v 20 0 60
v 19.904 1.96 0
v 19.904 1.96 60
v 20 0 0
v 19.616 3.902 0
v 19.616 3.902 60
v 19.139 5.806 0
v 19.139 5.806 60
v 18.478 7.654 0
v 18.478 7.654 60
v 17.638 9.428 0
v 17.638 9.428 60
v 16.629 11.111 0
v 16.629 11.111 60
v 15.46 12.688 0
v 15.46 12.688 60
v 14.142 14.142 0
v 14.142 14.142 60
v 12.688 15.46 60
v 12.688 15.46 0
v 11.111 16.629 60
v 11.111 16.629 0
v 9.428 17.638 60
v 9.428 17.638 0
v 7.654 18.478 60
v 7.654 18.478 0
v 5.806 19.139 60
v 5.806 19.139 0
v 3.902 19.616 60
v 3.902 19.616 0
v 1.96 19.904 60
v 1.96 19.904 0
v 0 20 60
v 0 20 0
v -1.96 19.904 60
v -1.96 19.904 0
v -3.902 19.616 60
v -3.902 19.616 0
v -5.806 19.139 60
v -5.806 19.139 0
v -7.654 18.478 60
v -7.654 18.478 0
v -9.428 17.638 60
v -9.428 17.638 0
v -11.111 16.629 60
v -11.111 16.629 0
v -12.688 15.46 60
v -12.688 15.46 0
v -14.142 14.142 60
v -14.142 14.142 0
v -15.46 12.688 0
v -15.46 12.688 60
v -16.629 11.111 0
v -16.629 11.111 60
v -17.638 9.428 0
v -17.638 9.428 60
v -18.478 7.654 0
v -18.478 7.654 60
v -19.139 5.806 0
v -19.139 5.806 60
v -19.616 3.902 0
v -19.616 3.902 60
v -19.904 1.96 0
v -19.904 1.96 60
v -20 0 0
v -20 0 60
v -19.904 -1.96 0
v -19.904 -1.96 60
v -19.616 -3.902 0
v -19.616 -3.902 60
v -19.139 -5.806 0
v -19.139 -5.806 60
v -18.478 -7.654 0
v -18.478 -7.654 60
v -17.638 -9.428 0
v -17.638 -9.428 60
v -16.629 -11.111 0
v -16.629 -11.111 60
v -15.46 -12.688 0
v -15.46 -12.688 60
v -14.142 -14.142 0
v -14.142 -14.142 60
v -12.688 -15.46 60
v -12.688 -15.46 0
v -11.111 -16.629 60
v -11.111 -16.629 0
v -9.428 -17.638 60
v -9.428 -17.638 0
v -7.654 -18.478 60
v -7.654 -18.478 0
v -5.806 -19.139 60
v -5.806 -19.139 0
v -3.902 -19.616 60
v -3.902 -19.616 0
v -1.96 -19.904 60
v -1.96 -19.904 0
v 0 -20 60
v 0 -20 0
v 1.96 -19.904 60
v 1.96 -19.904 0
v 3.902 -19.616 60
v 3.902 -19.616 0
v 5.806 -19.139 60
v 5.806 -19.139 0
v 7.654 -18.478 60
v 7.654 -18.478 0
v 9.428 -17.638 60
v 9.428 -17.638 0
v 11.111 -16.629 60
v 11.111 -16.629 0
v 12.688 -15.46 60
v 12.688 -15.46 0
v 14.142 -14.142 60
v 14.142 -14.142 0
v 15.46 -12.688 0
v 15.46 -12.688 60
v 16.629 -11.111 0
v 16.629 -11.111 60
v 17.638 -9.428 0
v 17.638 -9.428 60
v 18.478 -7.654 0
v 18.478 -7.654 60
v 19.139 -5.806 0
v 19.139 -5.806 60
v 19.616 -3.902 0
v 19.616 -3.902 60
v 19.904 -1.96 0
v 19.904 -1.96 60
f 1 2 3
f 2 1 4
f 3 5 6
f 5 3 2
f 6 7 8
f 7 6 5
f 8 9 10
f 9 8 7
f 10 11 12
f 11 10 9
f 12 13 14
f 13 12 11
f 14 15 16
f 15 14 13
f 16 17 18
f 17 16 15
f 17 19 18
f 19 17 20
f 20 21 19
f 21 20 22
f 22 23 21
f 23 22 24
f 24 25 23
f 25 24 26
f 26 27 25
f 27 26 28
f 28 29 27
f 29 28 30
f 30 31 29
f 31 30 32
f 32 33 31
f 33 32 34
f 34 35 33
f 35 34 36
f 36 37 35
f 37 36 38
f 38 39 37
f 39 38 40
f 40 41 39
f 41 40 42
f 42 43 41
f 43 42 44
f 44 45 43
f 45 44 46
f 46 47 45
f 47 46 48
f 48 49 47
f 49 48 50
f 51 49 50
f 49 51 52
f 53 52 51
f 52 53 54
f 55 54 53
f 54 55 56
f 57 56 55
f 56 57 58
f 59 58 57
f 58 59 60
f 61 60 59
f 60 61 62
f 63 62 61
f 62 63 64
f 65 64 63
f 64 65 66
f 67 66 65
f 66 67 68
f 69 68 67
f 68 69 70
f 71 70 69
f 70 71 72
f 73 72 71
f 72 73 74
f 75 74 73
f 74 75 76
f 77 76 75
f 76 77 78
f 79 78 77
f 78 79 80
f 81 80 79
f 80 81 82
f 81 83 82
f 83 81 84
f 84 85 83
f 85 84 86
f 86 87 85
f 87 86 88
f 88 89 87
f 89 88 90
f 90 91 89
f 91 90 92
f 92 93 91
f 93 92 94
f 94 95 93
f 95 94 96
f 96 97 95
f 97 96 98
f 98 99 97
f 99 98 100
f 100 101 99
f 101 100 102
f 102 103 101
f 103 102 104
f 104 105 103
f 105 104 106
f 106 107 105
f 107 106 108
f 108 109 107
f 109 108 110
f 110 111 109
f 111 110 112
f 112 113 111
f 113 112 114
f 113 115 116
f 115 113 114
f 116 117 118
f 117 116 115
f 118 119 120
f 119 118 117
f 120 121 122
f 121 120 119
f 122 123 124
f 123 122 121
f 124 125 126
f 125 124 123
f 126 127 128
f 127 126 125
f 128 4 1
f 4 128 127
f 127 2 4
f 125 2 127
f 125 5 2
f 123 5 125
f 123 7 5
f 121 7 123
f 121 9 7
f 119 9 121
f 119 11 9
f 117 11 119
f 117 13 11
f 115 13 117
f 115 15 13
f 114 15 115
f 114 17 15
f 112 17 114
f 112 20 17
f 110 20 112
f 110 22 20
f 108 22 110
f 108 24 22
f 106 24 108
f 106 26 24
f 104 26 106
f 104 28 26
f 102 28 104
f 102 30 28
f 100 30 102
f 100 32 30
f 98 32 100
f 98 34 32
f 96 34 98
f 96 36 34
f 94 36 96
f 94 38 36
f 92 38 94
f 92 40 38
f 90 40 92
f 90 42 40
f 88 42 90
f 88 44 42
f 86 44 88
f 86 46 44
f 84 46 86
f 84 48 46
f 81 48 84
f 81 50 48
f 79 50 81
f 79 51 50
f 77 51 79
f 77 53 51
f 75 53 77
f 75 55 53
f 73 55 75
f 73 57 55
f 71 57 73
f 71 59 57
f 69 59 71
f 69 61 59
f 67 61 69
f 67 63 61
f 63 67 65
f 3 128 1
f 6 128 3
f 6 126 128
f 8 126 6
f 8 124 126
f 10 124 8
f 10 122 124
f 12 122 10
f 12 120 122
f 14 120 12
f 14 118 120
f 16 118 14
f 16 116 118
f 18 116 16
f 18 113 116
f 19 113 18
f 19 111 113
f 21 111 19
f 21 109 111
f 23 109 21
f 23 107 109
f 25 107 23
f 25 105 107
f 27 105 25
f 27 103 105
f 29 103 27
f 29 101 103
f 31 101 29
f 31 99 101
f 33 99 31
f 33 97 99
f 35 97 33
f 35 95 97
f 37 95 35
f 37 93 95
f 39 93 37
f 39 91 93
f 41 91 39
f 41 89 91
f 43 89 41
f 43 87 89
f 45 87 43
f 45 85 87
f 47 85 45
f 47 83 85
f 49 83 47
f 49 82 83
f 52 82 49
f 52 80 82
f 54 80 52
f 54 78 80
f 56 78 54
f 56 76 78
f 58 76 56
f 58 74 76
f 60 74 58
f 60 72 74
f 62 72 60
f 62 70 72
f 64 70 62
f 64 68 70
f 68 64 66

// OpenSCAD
// Cylinder generator
/****************************
 * User parameters
 ****************************/
radius = 20;
height = 60;
center_cylinder = false;
$fn = 64;

/****************************
 * Assembly
 ****************************/
module cylinder_generator() {
    cylinder(h=height, r=radius, center=center_cylinder);
}

cylinder_generator();
